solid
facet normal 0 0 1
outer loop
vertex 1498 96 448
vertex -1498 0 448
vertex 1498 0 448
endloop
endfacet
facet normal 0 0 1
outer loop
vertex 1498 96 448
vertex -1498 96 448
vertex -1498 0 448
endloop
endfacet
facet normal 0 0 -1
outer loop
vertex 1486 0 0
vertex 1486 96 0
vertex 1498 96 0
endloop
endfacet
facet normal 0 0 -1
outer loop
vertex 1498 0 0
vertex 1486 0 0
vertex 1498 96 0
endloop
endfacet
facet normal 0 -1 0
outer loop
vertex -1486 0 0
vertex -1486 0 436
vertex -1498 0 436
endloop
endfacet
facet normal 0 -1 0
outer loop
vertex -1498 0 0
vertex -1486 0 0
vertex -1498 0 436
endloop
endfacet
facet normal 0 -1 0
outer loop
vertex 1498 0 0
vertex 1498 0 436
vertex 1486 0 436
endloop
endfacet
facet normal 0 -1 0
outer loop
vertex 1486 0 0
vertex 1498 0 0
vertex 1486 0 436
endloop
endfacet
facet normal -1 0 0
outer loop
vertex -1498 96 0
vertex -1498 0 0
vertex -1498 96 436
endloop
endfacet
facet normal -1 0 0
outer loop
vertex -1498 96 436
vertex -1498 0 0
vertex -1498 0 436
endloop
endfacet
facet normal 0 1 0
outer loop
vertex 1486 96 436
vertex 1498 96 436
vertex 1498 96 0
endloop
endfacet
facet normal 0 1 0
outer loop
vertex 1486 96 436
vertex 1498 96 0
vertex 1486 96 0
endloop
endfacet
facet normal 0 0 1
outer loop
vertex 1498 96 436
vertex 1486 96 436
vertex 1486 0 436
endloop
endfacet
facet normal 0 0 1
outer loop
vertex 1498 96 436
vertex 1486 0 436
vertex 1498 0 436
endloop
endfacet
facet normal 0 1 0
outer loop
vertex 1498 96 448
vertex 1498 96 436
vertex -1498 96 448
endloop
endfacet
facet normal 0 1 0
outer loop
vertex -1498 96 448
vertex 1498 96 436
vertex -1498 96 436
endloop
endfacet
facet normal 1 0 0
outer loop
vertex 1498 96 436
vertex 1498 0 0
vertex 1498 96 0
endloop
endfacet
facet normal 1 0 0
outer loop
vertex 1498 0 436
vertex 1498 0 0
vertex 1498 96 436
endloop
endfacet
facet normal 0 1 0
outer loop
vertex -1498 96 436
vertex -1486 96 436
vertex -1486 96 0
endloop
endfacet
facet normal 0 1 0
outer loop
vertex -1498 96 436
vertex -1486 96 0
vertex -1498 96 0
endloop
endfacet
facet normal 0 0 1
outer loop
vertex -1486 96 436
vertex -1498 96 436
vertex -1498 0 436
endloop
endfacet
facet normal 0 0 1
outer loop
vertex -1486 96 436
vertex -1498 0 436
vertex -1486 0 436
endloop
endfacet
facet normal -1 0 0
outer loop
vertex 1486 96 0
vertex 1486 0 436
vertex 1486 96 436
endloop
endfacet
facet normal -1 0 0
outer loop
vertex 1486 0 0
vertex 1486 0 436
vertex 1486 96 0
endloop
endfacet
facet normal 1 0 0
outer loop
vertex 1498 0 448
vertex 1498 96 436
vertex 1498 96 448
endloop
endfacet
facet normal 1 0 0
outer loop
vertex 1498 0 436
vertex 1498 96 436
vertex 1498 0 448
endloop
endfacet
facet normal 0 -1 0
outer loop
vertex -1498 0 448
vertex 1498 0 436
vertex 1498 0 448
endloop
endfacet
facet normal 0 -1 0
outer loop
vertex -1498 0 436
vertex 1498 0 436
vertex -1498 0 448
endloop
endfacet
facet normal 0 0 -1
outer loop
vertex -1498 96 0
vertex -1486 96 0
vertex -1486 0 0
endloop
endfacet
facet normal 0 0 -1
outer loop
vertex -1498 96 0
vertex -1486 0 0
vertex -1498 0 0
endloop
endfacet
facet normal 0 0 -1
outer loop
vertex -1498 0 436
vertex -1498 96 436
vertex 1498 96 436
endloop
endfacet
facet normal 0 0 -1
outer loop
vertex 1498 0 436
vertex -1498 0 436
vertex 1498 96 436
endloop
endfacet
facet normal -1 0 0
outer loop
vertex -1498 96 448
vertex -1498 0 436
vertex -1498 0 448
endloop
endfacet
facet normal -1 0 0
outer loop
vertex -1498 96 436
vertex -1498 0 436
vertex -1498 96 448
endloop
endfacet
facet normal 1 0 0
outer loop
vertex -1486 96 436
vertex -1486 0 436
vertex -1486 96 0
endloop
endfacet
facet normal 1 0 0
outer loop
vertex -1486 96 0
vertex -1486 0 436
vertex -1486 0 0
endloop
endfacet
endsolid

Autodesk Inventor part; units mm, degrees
ref_plane "YZ Plane" through (0, 0, 0) normal (1, 0, 0) x (0, 1, 0)
ref_plane "XZ Plane" through (0, 0, 0) normal (0, 1, 0) x (-1, 0, 0)
sketch "Sketch1" plane through (0, 0, 0) normal (0, 0, 1) x (1, 0, 0)
  line L0 (-1498, 0) -> (1498, 0) construction
  line L1 (-1498, 0) -> (-898, 0)
  line L2 (-898, 0) -> (-898, 2068)
  line L3 (-898, 2068) -> (-1498, 2068)
  line L4 (-1498, 2068) -> (-1498, 0)
  line L5 (-898, 0) -> (-498, 0)
  line L6 (-498, 0) -> (-498, 816)
  line L7 (-498, 816) -> (-898, 816)
  line L8 (-898, 816) -> (-898, 0)
  line L9 (-498, 0) -> (102, 0)
  line L10 (102, 0) -> (102, 816)
  line L11 (102, 816) -> (-498, 816)
  line L12 (-498, 816) -> (-498, 0)
  line L13 (102, 0) -> (698, 0)
  line L14 (698, 0) -> (698, 668)
  line L15 (698, 668) -> (102, 668)
  line L16 (102, 668) -> (102, 0)
  line L17 (698, 0) -> (1498, 0)
  line L18 (1498, 0) -> (1498, 816)
  line L19 (1498, 816) -> (698, 816)
  line L20 (698, 816) -> (698, 0)
  line L21 (-1498, 0) -> (1498, 0)
  line L22 (1498, 0) -> (1498, 96)
  line L23 (1498, 96) -> (-1498, 96)
  line L24 (-1498, 96) -> (-1498, 0)
  line L25 (-898, 816) -> (1498, 816)
  line L26 (1498, 816) -> (1498, 832)
  line L27 (1498, 832) -> (-898, 832)
  line L28 (-898, 832) -> (-898, 816)
  line L29 (-898, 1972) -> (-498, 1972)
  line L30 (-498, 1972) -> (-498, 1372)
  line L31 (-498, 1372) -> (-898, 1372)
  line L32 (-898, 1372) -> (-898, 1972)
  line L33 (698, 1972) -> (1498, 1972)
  line L34 (1498, 1972) -> (1498, 1372)
  line L35 (1498, 1372) -> (698, 1372)
  line L36 (698, 1372) -> (698, 1972)
  line L37 (698, 1372) -> (98, 1372)
  line L38 (98, 1372) -> (98, 1972)
  line L39 (98, 1972) -> (698, 1972)
  line L40 (698, 1972) -> (698, 1372)
  line L41 (-498, 1372) -> (98, 1372)
  line L42 (-498, 1372) -> (-275, 1637.7611)
  line L43 (98, 1372) -> (-125, 1637.7611)
  line L44 (-275, 1637.7611) -> (-125, 1637.7611)
  line L45 (-125, 1637.7611) -> (-125, 2068)
  line L46 (-125, 2068) -> (-275, 2068)
  line L47 (-275, 2068) -> (-275, 1637.7611)
  line L48 (1098, 816) -> (1098, 96)
  line L49 (-198, 816) -> (-198, 96)
  line L50 (-898, 668) -> (-498, 668)
  line L51 (-1498, 520) -> (-898, 520)
  line L52 (-1498, 1579) -> (-898, 1579)
  line L53 (398, 1972) -> (398, 1372)
  line L54 (1098, 1972) -> (1098, 1372)
  line L55 (698, 1876) -> (1498, 1876)
  line L56 (698, 1468) -> (1498, 1468)
  line L57 (-1498, 1049.5) -> (-898, 1049.5)
  point P0 (0, 0)
  point P1 (0, 0)
  point P2 (0, 0)
  point P3 (-198, 816)
  point P4 (0, 0)
  dimension "d0" = 2996
  dimension "d1" = 600
  dimension "d2" = 2068
  dimension "d3" = 400
  dimension "d4" = 816
  dimension "d5" = 600
  dimension "d6" = 816
  dimension "d7" = 596
  dimension "d8" = 668
  dimension "d9" = 800
  dimension "d10" = 816
  dimension "d11" = 96
  dimension "d12" = 16
  dimension "d13" = 400
  dimension "d14" = 600
  dimension "d15" = 96
  dimension "d16" = 800
  dimension "d17" = 600
  dimension "d18" = 600
  dimension "d19" = 600
  dimension "d20" = 50
  dimension "d21" = 150
  dimension "d22" = 148
  dimension "d23" = 1059
  dimension "d24" = 96
  dimension "d25" = 96
  dimension "d26" = 529.5
ref_plane "Work Plane1" through (0, 0, 436) normal (0, 0, 1) x (1, 0, 0)
sketch "Sketch2" plane through (0, 0, 436) normal (0, 0, 1) x (1, 0, 0)
  line L0 (1498, 96) -> (-1498, 96) projected
  line L1 (-1498, 96) -> (1498, 96)
  line L2 (1498, 96) -> (1498, 0)
  line L3 (1498, 0) -> (-1498, 0)
  line L4 (-1498, 0) -> (-1498, 96)
  point P0 (0, 0)
  point P1 (-1498, 0)
extrude "Extrusion1" add sketch "Sketch2" along normal blind 12
sketch "Sketch3" plane through (0, 0, 0) normal (0, 1, 0) x (-1, 0, 0)
  line L0 (1498, 436) -> (-1498, 436) projected
  line L1 (1498, 436) -> (1486, 436)
  line L2 (1486, 436) -> (1486, 0)
  line L3 (1486, 0) -> (1498, 0)
  line L4 (1498, 0) -> (1498, 436)
  line L5 (-1498, 436) -> (-1486, 436)
  line L6 (-1486, 436) -> (-1486, 0)
  line L7 (-1486, 0) -> (-1498, 0)
  line L8 (-1498, 0) -> (-1498, 436)
  point P0 (0, 0)
  dimension "d30" = 12
  dimension "d31" = 12
extrude "Extrusion2" add sketch "Sketch3" along normal up to surface (96 mm away) separate body
properties part number "Toe Kick"
